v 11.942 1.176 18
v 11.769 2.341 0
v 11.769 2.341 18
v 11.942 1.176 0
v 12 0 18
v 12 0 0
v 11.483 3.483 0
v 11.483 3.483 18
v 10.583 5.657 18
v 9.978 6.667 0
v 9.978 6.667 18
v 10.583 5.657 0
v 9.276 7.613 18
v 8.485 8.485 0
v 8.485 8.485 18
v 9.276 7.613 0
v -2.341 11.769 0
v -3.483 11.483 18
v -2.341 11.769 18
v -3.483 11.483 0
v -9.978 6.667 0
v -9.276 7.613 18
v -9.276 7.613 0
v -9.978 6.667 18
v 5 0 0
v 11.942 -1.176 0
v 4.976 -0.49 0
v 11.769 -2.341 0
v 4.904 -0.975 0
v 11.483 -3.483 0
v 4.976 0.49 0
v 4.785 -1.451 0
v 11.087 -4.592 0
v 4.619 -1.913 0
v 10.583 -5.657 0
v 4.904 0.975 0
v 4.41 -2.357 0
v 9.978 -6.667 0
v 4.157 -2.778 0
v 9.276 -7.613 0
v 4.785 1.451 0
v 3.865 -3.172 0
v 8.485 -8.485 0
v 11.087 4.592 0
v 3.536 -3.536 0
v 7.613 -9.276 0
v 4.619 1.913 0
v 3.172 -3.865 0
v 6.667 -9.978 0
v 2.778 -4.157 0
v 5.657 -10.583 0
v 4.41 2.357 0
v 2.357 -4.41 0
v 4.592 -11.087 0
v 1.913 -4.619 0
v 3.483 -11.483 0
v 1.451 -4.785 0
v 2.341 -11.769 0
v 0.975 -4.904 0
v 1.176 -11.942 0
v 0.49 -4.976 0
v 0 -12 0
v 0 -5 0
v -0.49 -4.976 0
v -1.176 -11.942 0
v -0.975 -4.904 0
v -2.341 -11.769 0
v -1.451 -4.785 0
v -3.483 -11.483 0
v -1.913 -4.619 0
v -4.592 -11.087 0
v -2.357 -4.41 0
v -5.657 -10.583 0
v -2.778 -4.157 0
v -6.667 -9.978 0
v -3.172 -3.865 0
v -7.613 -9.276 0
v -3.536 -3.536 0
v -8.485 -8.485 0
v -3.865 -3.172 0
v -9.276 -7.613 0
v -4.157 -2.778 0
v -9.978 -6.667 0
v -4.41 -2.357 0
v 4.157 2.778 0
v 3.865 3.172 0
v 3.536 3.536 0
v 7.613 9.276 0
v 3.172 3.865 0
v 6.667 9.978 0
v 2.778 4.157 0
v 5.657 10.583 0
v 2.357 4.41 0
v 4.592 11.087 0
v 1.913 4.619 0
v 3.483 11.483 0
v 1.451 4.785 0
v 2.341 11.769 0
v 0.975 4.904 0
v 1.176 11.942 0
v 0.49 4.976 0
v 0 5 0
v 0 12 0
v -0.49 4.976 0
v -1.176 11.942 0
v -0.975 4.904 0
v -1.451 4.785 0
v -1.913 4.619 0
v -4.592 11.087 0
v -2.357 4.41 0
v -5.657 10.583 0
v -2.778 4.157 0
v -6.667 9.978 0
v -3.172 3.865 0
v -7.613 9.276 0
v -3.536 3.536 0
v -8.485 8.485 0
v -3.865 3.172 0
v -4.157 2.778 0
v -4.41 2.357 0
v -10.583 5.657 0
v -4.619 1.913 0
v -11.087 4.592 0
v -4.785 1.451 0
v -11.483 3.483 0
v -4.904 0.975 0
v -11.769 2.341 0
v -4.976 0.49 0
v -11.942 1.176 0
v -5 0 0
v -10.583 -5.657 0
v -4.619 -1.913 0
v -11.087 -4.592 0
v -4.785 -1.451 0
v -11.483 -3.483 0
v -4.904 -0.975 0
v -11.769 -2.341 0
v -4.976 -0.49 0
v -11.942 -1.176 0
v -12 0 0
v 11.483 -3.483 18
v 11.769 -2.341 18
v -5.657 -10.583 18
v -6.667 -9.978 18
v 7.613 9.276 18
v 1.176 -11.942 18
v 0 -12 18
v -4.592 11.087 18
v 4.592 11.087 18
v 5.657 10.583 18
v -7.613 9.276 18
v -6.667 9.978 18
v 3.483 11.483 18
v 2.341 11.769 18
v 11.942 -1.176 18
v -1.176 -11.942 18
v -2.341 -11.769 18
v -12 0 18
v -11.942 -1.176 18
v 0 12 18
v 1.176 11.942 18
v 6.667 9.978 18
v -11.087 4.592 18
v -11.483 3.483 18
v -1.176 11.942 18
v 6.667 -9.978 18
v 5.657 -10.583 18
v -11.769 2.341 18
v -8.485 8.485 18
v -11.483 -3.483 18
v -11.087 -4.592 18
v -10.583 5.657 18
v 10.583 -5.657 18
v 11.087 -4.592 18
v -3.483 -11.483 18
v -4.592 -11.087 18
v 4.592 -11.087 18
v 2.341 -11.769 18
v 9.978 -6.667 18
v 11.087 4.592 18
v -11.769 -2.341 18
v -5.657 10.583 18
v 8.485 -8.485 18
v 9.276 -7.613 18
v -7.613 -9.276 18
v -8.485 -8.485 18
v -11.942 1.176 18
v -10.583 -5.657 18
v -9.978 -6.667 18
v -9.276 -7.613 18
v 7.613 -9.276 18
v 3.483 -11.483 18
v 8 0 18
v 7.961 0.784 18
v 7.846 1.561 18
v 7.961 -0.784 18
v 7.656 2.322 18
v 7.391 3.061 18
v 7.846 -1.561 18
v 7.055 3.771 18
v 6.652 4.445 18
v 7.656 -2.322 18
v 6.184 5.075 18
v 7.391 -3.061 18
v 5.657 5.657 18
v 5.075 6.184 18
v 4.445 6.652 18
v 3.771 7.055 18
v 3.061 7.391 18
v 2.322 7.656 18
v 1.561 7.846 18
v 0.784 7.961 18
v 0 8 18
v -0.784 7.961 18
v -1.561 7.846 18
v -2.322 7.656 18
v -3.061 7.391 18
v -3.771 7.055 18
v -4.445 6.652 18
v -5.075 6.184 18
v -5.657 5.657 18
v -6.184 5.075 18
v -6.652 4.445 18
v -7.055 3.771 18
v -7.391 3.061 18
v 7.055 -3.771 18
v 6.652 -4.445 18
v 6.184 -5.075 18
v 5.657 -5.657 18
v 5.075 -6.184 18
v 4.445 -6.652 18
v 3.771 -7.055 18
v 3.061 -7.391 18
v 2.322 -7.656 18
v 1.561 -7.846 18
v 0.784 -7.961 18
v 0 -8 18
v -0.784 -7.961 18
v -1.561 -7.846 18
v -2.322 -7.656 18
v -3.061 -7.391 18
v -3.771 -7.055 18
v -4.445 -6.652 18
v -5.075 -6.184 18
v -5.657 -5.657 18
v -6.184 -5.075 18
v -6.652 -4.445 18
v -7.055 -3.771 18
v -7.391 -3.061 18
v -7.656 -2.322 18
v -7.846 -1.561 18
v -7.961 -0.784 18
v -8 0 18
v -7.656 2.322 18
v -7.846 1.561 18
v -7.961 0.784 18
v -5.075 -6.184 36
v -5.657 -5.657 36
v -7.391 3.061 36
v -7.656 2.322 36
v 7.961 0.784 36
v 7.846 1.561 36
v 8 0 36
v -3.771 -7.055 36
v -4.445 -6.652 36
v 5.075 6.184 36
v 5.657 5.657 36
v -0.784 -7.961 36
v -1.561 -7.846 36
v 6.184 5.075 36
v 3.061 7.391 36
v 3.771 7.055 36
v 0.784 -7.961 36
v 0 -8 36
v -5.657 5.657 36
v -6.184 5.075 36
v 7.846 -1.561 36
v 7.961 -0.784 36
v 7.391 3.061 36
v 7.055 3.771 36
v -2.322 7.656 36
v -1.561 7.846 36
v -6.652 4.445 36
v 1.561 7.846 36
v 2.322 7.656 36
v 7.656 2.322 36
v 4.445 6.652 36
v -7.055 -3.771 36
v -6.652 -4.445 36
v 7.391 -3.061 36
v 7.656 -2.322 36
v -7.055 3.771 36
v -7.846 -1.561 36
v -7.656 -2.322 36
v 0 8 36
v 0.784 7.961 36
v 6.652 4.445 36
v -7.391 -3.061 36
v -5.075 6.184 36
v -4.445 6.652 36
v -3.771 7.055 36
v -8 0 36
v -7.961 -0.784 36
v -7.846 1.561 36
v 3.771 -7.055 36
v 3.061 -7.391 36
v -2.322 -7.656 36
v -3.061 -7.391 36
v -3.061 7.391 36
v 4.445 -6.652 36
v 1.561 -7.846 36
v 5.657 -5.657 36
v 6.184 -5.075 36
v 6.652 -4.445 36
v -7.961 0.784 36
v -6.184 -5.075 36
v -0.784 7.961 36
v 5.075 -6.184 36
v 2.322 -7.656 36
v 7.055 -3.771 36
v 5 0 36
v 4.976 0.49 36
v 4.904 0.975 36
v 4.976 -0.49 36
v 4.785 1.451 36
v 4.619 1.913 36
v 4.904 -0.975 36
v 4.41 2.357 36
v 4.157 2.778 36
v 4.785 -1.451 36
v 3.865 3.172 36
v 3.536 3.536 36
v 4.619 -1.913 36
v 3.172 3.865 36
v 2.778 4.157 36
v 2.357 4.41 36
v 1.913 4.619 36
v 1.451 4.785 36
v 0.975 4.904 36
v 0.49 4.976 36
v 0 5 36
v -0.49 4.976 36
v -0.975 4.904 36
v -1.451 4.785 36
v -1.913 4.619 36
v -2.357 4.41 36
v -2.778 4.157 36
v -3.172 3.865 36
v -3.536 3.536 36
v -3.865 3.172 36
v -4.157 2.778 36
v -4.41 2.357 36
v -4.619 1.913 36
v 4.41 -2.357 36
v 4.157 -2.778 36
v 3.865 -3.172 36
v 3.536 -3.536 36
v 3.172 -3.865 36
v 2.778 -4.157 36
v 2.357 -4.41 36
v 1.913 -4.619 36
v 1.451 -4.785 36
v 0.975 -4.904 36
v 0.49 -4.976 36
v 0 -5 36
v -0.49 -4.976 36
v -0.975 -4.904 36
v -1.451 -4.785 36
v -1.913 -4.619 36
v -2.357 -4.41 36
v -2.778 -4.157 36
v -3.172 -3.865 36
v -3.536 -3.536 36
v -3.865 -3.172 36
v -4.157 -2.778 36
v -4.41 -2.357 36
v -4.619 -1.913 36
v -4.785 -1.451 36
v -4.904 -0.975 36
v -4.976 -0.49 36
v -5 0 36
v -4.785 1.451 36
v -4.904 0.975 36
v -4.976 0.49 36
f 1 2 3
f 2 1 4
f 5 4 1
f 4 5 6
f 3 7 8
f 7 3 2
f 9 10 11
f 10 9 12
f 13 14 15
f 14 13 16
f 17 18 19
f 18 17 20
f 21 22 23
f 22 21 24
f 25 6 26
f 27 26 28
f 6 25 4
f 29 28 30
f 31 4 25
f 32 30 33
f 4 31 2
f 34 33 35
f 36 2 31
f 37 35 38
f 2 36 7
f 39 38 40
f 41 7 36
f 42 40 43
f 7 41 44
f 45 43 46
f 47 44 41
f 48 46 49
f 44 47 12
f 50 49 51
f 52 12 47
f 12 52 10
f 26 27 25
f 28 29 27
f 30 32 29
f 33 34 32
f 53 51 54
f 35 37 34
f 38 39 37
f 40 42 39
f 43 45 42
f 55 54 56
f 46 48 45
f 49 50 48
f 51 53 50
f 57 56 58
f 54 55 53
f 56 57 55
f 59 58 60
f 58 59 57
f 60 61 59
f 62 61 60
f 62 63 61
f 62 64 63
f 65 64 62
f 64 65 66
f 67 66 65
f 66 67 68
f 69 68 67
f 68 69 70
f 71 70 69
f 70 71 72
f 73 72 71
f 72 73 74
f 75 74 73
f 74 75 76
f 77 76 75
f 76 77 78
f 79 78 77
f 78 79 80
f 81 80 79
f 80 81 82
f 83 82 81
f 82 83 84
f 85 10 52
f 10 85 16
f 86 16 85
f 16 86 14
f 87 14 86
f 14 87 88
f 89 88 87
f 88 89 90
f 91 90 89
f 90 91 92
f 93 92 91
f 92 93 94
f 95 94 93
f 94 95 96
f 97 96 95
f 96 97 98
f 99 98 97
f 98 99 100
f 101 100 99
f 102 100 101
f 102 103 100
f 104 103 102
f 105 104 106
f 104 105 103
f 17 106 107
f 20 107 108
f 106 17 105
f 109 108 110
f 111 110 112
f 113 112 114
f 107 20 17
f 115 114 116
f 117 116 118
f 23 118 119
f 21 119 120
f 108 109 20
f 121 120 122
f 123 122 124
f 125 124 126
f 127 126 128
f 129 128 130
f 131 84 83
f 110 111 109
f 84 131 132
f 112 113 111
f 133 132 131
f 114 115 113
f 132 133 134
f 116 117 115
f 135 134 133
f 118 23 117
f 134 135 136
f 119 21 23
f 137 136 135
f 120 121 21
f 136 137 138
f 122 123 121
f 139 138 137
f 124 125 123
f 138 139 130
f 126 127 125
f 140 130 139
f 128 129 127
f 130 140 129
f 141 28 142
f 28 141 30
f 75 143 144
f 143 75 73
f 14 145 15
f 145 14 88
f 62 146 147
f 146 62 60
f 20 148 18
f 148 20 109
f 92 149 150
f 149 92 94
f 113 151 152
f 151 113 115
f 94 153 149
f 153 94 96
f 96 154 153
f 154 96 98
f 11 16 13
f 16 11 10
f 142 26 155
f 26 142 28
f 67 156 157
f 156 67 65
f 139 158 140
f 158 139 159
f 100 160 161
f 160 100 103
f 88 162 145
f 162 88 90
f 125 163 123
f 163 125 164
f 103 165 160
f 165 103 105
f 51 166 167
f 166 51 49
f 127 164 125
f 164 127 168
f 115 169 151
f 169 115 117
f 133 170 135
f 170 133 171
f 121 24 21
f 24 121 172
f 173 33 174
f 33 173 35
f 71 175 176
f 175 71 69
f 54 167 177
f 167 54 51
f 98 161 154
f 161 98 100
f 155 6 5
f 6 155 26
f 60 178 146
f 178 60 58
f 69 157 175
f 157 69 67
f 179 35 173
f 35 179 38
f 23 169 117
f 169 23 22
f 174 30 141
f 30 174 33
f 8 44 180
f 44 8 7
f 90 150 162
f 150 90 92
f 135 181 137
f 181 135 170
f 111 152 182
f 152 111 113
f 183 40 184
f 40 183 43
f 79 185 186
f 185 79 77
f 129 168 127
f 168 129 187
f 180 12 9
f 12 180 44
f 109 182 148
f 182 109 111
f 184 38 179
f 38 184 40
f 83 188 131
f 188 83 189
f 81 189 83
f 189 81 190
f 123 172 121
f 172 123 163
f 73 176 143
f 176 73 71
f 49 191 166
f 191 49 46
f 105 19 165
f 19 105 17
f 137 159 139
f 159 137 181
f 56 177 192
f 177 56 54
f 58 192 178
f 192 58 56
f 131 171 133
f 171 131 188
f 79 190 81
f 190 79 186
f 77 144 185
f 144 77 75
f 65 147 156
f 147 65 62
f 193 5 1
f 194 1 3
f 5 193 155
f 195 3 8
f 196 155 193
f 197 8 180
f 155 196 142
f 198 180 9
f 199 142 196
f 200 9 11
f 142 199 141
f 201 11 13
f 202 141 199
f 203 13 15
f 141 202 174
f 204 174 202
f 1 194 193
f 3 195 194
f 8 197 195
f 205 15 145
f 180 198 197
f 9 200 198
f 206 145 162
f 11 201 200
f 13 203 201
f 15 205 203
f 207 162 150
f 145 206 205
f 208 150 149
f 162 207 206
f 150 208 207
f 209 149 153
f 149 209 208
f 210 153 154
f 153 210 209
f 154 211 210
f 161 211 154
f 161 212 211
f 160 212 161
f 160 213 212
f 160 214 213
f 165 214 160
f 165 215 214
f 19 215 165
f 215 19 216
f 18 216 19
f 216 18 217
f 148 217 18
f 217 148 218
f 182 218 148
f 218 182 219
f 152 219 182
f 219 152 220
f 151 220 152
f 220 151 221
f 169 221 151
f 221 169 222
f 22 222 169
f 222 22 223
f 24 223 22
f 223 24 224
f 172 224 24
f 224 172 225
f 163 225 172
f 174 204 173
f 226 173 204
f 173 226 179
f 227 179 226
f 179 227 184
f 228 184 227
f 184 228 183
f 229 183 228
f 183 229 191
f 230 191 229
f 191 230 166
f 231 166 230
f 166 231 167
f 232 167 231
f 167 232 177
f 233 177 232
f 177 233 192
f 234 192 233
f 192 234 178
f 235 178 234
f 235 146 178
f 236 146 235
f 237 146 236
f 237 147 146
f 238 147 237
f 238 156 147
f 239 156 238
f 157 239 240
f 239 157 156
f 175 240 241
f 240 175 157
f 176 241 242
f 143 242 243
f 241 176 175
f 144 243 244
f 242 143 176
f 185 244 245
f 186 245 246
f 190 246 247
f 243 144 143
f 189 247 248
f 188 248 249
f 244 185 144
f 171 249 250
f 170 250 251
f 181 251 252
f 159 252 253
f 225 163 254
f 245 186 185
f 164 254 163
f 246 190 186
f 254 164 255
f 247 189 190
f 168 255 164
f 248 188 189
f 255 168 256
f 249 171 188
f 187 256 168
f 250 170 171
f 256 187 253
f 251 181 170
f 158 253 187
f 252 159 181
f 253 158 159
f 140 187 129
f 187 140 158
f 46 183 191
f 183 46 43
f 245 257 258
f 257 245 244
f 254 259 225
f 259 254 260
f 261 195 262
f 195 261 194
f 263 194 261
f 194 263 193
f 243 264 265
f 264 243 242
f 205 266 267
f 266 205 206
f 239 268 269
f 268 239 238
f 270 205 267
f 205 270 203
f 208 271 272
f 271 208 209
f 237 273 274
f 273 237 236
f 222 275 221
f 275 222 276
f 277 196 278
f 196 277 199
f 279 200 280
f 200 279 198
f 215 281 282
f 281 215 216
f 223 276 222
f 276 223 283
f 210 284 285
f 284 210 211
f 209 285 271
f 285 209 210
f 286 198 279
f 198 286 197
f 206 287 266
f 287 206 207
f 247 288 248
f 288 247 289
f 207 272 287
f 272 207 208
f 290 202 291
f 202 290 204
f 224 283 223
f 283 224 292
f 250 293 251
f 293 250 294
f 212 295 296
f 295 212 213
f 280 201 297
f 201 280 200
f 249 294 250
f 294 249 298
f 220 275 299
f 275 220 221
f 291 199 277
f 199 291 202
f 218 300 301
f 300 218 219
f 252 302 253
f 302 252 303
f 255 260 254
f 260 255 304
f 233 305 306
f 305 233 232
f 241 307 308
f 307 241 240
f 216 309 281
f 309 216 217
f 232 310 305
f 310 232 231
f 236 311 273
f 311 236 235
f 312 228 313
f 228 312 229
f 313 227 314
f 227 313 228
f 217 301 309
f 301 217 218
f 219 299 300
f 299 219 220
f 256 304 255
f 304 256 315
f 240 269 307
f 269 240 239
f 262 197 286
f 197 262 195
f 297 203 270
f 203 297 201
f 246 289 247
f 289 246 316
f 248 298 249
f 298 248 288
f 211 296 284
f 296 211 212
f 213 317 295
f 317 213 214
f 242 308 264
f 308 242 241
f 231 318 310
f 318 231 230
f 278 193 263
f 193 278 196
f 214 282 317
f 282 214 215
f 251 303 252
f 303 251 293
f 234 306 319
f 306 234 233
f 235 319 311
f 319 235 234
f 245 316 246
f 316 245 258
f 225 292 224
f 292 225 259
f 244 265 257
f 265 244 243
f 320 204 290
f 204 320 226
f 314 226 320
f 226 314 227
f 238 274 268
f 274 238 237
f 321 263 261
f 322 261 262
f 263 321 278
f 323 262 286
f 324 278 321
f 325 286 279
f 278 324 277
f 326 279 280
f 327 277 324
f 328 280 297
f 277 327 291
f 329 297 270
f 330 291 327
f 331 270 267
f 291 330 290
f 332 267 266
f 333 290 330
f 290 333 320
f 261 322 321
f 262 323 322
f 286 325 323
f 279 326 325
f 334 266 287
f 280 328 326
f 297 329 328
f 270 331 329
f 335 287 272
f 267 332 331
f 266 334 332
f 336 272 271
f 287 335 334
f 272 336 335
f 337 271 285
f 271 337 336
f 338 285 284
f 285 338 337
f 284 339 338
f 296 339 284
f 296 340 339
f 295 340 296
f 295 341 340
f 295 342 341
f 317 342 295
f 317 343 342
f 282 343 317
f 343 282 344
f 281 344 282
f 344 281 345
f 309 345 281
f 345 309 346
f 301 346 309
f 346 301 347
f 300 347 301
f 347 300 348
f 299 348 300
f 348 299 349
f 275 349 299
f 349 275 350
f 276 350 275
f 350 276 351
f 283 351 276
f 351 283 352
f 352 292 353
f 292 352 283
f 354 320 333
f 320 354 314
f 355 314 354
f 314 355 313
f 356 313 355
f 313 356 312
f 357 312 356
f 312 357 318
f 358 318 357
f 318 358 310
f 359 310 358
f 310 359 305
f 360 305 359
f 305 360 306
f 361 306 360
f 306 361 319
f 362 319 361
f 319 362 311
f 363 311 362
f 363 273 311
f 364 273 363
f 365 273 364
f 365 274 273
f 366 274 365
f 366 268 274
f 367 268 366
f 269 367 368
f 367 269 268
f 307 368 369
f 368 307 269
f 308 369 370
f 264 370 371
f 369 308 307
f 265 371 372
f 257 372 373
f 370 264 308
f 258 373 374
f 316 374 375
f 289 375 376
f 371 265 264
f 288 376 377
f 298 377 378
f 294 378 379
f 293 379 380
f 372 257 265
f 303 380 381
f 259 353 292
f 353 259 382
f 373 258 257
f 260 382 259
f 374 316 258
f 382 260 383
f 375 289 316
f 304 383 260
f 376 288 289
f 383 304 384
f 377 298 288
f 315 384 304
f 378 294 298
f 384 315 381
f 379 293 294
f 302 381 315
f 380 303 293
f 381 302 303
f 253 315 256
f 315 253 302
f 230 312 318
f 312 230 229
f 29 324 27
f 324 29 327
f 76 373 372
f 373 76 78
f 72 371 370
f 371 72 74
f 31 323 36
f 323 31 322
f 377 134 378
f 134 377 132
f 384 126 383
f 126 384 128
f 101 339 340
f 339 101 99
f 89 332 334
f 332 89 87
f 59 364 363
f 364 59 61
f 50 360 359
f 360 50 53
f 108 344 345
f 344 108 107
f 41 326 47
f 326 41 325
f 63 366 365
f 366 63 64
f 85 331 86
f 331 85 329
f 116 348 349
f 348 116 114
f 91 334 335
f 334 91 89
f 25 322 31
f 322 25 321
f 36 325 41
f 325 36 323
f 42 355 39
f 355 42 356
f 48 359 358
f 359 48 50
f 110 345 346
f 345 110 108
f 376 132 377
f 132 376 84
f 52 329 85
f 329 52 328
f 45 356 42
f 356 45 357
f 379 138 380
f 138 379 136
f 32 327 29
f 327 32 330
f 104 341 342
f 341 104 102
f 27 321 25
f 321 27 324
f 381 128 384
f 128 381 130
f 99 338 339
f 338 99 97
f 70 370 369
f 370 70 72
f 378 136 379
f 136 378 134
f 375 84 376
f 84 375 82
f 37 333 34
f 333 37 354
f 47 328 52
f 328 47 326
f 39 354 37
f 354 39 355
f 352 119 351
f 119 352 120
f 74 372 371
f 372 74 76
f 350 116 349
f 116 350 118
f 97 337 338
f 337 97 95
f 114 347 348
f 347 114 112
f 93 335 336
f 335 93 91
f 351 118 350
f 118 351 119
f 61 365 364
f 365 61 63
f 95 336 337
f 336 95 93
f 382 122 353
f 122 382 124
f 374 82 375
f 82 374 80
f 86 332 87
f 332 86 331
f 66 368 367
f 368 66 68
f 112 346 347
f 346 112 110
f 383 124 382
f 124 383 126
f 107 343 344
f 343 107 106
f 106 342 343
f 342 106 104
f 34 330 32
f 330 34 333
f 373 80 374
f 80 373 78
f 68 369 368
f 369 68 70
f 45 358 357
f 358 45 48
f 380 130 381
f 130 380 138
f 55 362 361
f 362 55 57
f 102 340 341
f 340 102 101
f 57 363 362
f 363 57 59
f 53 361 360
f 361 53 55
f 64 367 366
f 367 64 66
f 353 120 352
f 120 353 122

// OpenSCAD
// Stepped tube adapter - two coaxial tube sections of different diameter joined at a shoulder and
// bored through, to couple two tube sizes. NOVEL general part (a generic reducer).
//
// @desc hollow stepped adapter joining two tube diameters
// @prompt Design a stepped tube adapter in OpenSCAD: a section {d1} mm across and {l1} mm long joined to a section {d2} mm across and {l2} mm long, bored through with a {bore} mm hole. Reply with a single complete OpenSCAD file.
// @param d1   first outer diameter, mm   [14:34]
// @param l1   first length, mm           [10:30]
// @param d2   second outer diameter, mm  [8:24]
// @param l2   second length, mm          [10:30]
// @param bore through-bore diameter, mm  [4:16]

d1   = 24;
l1   = 18;
d2   = 16;
l2   = 18;
bore = 10;

$fn = 64;

b = min(bore, d2 - 2, d1 - 2);        // keep a wall in the narrower section

difference() {
    union() {
        cylinder(h = l1, d = d1);
        translate([0, 0, l1 - 0.01]) cylinder(h = l2 + 0.01, d = d2);
    }
    translate([0, 0, -1]) cylinder(h = l1 + l2 + 2, d = b);   // through-bore
}
